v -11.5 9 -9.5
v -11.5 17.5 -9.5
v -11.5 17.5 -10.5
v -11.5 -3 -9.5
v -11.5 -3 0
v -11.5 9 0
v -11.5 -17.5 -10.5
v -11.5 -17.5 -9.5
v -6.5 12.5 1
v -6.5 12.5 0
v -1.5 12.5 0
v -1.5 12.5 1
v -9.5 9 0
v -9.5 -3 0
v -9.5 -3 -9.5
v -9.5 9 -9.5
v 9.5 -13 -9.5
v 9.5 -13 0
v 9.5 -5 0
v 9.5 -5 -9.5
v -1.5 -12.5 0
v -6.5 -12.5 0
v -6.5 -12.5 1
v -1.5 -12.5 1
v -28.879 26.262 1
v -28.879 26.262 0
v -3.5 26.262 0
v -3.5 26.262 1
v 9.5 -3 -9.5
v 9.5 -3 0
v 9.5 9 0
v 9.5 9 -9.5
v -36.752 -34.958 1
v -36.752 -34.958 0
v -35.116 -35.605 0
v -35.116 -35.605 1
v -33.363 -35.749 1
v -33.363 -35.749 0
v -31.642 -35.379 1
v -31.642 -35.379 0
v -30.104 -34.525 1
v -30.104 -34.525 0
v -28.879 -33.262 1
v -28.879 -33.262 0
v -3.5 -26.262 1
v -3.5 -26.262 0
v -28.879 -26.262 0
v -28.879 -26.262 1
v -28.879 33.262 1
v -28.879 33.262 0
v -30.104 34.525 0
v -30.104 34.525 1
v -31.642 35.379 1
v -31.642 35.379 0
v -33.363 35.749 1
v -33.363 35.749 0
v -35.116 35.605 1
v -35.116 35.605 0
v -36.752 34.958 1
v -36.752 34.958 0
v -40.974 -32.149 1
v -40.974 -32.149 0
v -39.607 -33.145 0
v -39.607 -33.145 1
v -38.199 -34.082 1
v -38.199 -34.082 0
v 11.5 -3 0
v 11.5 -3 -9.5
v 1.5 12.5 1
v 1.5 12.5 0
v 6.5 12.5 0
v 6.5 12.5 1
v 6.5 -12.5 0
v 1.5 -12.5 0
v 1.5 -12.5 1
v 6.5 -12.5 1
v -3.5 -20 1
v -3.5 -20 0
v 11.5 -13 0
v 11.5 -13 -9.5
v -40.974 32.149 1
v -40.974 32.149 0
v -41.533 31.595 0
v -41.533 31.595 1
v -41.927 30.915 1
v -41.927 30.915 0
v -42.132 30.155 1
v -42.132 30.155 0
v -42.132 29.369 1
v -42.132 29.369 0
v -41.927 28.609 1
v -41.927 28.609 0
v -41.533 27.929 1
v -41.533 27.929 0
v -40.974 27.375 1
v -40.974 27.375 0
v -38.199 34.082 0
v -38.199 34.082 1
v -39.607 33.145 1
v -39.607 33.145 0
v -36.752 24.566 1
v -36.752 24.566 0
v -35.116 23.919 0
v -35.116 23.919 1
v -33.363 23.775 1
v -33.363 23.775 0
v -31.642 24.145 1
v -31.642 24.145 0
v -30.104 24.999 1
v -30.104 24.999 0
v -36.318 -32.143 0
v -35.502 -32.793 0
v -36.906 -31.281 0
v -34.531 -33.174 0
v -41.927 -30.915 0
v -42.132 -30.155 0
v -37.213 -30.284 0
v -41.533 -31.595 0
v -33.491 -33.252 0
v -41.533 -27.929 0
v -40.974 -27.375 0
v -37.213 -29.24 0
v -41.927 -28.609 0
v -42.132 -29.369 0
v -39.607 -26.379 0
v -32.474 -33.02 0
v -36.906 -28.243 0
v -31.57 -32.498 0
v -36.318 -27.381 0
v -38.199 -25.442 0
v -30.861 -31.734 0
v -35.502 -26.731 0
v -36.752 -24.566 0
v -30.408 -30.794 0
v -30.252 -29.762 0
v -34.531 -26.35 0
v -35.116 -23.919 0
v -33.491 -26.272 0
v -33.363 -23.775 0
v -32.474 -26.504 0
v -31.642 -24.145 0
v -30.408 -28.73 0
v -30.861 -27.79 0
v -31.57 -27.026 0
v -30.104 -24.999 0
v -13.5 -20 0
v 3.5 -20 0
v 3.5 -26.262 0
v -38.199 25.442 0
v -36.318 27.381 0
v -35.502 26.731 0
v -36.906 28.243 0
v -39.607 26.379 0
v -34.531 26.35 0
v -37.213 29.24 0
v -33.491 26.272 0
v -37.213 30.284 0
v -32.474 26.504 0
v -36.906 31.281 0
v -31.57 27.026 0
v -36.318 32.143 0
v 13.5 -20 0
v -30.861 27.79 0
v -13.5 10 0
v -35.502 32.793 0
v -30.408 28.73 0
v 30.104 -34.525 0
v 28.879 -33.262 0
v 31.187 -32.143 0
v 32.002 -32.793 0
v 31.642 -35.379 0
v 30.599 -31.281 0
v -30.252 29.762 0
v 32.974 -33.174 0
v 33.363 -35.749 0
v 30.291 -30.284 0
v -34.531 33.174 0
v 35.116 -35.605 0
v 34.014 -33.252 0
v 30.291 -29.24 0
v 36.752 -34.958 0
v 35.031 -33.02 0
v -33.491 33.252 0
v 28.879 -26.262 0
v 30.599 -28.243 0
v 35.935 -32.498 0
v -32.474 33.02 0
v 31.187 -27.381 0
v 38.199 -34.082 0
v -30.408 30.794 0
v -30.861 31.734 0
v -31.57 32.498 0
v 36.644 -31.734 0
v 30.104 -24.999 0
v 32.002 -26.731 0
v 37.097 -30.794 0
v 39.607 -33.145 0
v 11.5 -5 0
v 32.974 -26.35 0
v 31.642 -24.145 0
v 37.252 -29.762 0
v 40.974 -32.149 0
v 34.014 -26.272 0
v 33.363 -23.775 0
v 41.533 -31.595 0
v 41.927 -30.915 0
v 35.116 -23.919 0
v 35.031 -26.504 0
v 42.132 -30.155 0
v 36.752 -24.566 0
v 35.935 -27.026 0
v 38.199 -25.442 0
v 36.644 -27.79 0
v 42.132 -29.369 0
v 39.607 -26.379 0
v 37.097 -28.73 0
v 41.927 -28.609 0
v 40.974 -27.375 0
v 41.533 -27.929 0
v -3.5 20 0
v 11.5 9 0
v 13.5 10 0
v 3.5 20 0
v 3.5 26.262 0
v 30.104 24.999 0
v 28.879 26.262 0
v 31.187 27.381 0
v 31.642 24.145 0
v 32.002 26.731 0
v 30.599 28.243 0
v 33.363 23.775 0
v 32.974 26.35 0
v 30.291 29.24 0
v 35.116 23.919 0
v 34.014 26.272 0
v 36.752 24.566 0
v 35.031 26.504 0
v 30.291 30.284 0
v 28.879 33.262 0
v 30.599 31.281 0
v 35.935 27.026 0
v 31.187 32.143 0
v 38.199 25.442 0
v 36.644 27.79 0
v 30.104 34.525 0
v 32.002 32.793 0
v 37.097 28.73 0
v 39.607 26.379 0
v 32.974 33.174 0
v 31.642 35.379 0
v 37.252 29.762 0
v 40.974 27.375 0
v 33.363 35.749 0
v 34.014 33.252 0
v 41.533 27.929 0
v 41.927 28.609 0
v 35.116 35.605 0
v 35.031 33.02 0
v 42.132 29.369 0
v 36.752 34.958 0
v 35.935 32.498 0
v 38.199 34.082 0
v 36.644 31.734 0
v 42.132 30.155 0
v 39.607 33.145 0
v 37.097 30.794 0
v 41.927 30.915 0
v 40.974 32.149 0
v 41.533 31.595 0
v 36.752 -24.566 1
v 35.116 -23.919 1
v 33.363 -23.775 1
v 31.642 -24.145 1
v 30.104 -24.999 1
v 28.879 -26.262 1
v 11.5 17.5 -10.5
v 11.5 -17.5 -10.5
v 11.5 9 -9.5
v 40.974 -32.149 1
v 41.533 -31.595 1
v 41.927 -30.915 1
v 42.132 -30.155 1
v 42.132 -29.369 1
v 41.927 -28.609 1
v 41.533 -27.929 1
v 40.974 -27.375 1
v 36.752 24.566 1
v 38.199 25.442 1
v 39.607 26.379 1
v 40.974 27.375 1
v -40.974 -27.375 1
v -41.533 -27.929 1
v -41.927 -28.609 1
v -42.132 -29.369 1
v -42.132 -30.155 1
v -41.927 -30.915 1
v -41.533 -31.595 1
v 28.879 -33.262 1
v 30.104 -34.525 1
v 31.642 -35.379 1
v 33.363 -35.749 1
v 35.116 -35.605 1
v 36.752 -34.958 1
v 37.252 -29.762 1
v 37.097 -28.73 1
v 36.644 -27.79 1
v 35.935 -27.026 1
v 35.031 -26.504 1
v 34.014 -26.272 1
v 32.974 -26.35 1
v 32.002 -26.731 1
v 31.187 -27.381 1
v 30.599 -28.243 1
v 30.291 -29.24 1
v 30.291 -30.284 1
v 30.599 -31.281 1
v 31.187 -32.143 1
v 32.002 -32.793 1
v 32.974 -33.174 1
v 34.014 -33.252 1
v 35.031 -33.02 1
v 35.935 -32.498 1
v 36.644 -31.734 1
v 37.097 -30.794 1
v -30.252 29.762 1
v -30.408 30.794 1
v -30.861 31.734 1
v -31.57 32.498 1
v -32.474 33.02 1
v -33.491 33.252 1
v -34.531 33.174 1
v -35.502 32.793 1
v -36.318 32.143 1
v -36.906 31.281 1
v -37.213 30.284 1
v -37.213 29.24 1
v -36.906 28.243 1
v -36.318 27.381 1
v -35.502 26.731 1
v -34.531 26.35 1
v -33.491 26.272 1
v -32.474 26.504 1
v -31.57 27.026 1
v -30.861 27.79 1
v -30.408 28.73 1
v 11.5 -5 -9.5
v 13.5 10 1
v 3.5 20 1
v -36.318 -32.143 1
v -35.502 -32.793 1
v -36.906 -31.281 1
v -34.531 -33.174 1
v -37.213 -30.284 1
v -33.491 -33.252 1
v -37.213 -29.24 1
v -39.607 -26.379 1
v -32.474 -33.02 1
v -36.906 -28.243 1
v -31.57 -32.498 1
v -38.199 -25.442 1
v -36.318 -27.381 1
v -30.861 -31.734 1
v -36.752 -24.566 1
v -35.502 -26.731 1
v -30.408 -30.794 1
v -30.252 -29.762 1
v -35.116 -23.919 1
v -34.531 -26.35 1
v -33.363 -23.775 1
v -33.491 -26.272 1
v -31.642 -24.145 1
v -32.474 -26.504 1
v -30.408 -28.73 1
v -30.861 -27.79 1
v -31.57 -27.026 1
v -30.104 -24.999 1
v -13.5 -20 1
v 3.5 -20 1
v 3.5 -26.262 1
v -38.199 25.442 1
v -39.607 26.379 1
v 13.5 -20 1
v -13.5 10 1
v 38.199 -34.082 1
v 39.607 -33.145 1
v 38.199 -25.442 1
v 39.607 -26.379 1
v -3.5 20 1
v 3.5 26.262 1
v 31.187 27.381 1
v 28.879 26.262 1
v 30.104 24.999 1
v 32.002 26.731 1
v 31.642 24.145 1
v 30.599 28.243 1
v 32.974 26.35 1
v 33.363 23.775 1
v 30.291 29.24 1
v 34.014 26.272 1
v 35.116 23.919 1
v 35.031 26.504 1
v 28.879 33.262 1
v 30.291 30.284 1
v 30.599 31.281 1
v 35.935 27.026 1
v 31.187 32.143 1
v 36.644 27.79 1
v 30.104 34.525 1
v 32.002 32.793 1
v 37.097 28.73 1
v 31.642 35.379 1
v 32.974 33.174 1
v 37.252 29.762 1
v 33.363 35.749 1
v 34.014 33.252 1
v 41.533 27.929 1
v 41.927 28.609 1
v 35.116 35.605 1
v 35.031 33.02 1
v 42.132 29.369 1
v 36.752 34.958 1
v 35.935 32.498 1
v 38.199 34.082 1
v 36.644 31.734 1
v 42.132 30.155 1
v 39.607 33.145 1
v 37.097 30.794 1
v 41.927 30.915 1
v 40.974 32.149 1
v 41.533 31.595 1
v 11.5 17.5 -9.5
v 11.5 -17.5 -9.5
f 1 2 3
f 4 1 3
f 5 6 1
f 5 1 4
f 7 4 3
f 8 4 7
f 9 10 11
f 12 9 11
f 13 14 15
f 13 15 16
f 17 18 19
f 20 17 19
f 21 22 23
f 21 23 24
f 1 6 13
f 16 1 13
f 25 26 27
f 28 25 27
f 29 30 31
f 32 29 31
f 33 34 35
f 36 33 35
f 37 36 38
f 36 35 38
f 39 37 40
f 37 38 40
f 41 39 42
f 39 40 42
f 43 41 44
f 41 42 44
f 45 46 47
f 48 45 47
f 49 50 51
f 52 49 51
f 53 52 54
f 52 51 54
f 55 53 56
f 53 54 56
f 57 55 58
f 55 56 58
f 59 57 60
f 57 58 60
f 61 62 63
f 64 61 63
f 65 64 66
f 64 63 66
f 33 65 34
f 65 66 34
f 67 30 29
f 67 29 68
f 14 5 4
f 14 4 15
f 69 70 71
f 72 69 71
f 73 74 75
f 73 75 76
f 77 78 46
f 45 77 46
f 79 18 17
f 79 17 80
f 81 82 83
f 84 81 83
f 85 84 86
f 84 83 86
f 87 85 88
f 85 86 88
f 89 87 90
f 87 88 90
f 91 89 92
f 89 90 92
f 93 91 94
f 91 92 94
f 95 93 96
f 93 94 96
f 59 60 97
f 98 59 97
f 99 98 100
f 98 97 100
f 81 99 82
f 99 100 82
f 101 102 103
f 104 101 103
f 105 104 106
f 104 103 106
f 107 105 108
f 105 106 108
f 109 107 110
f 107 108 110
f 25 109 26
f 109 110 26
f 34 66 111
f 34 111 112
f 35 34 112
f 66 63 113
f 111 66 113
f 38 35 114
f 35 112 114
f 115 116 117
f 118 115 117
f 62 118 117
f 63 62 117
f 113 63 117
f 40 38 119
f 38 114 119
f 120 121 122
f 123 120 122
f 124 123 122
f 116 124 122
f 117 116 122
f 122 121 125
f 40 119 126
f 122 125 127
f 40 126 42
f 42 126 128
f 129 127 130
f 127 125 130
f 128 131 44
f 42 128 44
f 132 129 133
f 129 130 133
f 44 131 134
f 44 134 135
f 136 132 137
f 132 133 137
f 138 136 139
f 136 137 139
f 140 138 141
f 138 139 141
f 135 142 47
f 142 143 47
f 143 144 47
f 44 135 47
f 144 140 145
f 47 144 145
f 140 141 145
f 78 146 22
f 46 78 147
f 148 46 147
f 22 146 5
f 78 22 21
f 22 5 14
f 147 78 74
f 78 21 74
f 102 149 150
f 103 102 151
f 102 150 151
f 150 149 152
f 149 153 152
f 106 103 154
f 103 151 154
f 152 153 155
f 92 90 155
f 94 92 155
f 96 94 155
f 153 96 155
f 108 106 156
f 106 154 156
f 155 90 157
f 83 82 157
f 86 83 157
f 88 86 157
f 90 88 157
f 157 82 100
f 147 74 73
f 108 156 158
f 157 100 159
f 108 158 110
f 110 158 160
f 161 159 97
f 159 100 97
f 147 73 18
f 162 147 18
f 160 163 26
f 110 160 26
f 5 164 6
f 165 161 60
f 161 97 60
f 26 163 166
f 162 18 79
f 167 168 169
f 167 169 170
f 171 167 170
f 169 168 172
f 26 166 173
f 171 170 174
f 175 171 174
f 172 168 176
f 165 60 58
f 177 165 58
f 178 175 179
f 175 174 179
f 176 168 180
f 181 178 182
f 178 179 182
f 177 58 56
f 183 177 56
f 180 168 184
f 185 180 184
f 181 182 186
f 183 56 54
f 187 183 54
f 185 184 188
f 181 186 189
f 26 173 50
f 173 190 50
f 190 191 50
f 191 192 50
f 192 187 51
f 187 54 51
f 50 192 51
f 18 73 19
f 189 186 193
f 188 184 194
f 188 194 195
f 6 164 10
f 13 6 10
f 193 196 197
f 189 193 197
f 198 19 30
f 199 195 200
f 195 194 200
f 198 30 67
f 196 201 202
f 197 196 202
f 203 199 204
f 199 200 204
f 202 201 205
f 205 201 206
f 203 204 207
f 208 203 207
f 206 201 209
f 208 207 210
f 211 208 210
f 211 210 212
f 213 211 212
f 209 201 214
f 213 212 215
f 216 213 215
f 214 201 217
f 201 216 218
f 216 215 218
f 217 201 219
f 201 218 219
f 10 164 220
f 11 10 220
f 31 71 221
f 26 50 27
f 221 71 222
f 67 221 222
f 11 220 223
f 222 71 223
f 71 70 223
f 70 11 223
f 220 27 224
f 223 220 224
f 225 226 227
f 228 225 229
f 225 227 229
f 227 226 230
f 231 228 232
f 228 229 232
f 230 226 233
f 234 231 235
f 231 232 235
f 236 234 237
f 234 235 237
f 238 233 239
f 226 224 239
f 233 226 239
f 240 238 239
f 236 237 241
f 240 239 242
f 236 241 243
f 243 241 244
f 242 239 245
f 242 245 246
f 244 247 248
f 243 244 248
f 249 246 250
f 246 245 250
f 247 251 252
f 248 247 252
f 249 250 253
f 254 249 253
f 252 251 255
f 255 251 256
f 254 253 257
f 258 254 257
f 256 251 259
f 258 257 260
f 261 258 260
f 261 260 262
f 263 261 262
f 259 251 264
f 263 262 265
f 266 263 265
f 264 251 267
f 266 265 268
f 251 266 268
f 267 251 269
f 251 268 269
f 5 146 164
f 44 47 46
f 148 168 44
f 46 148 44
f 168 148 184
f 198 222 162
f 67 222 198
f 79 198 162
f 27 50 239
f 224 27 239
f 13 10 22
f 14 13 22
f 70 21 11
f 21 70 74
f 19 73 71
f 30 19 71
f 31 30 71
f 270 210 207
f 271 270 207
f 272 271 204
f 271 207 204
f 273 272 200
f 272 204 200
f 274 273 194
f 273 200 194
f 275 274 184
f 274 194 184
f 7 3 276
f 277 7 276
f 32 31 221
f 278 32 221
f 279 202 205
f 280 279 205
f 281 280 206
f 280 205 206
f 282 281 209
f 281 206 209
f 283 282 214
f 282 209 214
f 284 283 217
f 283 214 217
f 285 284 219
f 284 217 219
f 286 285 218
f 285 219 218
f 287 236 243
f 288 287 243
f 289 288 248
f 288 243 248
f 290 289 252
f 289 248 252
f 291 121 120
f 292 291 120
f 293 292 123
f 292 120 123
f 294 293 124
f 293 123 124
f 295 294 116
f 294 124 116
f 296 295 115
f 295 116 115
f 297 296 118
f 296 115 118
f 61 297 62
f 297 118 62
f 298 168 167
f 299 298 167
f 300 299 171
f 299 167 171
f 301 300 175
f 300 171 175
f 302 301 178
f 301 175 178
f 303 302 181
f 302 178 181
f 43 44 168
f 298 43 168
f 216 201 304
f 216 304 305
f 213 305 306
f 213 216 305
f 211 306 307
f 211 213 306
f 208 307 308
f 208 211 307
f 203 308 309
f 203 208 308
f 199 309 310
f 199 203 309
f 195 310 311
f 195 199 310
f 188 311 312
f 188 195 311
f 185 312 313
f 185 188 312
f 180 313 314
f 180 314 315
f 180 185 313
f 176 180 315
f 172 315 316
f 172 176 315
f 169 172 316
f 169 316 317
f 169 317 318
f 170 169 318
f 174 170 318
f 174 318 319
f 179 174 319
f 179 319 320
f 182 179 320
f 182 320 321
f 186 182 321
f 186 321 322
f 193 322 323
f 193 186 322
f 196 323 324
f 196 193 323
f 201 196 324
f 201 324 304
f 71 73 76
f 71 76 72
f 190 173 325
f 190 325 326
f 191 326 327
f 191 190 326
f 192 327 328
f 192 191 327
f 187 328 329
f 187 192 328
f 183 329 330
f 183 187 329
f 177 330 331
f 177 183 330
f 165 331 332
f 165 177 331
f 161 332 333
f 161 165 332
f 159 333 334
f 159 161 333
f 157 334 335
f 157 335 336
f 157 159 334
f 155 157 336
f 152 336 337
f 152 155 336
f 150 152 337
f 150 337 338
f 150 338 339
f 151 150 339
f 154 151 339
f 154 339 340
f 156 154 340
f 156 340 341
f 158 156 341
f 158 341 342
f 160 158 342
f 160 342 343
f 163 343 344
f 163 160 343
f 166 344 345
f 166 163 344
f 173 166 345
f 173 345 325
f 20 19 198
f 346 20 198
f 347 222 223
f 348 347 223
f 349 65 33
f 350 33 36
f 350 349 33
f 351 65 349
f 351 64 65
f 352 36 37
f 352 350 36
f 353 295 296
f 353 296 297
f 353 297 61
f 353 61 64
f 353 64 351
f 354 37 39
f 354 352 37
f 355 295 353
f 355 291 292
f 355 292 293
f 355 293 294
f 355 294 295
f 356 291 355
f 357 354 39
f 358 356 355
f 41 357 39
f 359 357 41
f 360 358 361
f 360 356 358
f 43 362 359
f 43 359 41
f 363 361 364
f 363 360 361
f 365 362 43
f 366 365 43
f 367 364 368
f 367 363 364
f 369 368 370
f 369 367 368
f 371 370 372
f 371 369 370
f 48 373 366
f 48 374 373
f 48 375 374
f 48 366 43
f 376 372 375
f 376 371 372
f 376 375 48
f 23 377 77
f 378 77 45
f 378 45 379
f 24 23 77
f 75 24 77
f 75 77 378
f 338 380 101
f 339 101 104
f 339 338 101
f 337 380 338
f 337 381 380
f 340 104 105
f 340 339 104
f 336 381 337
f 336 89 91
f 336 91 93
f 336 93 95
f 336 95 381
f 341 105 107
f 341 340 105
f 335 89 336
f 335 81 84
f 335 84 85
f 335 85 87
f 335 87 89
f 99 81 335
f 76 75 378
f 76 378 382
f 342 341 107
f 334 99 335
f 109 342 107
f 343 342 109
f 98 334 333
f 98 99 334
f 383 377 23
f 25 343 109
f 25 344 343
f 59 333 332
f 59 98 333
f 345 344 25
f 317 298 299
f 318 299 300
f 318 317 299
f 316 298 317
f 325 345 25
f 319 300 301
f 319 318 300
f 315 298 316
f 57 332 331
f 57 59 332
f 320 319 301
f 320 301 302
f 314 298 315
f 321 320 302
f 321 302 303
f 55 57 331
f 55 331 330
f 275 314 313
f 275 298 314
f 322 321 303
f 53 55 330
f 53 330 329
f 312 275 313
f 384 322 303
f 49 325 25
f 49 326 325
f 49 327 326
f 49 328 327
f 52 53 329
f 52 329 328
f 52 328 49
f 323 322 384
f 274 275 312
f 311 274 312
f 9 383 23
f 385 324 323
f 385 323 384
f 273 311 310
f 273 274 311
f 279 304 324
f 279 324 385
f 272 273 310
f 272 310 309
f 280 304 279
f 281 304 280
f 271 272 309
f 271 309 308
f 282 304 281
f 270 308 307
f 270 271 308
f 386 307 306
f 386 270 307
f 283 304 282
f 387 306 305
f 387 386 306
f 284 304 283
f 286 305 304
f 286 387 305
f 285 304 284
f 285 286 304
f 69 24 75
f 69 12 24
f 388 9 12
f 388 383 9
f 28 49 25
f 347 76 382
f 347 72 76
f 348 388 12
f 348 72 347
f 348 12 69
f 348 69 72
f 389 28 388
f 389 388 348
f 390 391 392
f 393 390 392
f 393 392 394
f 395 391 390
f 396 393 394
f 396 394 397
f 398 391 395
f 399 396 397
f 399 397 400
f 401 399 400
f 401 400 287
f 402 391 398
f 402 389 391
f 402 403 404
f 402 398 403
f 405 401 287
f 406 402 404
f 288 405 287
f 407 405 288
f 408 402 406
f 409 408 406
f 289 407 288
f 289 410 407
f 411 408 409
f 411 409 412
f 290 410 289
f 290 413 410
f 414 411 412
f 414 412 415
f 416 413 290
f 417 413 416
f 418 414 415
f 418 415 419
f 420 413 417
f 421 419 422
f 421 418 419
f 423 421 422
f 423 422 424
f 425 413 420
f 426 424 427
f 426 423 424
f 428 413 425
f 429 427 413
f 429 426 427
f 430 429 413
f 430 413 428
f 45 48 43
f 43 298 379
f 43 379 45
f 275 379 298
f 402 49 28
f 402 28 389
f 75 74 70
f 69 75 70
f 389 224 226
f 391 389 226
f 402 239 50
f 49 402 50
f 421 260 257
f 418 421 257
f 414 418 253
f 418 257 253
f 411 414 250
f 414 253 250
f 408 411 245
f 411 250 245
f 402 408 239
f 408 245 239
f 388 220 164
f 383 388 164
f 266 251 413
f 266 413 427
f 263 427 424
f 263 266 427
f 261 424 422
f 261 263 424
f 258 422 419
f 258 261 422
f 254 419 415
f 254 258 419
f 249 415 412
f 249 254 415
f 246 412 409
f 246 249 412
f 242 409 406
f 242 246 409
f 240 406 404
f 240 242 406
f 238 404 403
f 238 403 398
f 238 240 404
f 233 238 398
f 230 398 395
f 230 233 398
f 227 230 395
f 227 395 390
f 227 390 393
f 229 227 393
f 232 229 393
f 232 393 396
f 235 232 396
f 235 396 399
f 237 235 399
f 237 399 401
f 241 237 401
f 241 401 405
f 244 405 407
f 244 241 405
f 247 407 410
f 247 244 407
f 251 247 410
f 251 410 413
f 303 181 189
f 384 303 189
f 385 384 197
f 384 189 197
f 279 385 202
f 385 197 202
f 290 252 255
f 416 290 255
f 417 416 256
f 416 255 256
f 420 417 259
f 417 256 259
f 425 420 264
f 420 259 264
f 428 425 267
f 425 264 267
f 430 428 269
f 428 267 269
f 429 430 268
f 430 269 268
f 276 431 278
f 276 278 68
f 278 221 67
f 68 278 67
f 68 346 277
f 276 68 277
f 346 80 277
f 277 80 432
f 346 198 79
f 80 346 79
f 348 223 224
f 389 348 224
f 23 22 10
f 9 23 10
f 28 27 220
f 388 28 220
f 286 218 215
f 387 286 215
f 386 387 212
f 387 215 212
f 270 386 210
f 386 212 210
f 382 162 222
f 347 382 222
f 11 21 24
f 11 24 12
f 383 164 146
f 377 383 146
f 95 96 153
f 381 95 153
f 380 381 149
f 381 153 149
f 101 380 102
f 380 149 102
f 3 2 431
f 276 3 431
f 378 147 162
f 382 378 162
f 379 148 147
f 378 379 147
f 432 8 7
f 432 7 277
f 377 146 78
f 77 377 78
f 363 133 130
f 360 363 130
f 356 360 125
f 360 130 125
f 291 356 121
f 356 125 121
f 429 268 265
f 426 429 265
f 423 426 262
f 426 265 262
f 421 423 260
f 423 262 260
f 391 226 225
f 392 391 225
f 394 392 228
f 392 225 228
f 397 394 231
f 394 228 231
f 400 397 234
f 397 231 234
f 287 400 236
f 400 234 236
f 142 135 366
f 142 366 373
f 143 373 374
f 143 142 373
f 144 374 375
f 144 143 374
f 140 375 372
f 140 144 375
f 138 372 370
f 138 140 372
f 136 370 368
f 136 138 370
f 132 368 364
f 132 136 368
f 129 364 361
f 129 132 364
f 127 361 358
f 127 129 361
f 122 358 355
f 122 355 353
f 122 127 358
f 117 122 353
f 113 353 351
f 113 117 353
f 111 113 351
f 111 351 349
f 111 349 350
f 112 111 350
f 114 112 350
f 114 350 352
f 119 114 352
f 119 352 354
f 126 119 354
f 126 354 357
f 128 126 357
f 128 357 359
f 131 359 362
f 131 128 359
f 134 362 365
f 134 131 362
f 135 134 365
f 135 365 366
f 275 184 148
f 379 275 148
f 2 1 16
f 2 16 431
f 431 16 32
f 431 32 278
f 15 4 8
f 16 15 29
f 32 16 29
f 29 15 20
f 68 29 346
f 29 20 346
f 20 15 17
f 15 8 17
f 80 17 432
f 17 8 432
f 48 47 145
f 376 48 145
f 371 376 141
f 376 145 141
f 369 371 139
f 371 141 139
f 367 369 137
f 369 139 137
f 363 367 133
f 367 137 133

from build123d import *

# Parameters (mm, degrees)
F0_R     = 3.5
F0_W     = 5
F0_H     = 25
F1_DEPTH = 1
F2_W     = 2
F2_H     = 8
F2_W_2   = 1.9999998777
F2_H_2   = 12
F3_DEPTH = 9.5
F4_W     = 23
F4_H     = 35
F5_DEPTH = 1


with BuildPart() as f1:
    # F0 (on Top) → F1 (new body)
    with BuildSketch(Plane.XY):
        with BuildLine():
            Line((-3.5, 20), (-13.5, 10))
            Line((-13.5, 10), (-13.5, -20))
            Line((-13.5, -20), (-3.5, -20))
            Line((-3.5, -20), (-3.5, -26.2619838908))
            Line((-3.5, -26.2619838908), (-28.879, -26.2619838908))
            ThreePointArc((-28.879, -26.2619838908), (-32.4888159516, -23.8965459278), (-36.7523971724, -24.5658314681))
            ThreePointArc((-36.7523971724, -24.5658314681), (-38.907954465, -25.9032249779), (-40.974404202, -27.3745625074))
            ThreePointArc((-40.974404202, -27.3745625074), (-42.1577536748, -29.7619838908), (-40.974404202, -32.1494052742))
            ThreePointArc((-40.974404202, -32.1494052742), (-38.907954465, -33.6207428037), (-36.7523971724, -34.9581363135))
            ThreePointArc((-36.7523971724, -34.9581363135), (-32.4888159516, -35.6274218538), (-28.879, -33.2619838908))
            Line((-28.879, -33.2619838908), (28.879, -33.2619838908))
            ThreePointArc((28.879, -33.2619838908), (32.4888159516, -35.6274218538), (36.7523971724, -34.9581363135))
            ThreePointArc((36.7523971724, -34.9581363135), (38.907954465, -33.6207428037), (40.974404202, -32.1494052742))
            ThreePointArc((40.974404202, -32.1494052742), (42.1577536748, -29.7619838908), (40.974404202, -27.3745625074))
            ThreePointArc((40.974404202, -27.3745625074), (38.907954465, -25.9032249779), (36.7523971724, -24.5658314681))
            ThreePointArc((36.7523971724, -24.5658314681), (32.4888159516, -23.8965459278), (28.879, -26.2619838908))
            Line((28.879, -26.2619838908), (3.5, -26.2619838908))
            Line((3.5, -26.2619838908), (3.5, -20))
            Line((3.5, -20), (13.5, -20))
            Line((13.5, -20), (13.5, 10))
            Line((13.5, 10), (3.5, 20))
            Line((3.5, 20), (3.5, 26.2619838908))
            Line((3.5, 26.2619838908), (28.879, 26.2619838908))
            ThreePointArc((28.879, 26.2619838908), (32.4888159516, 23.8965459278), (36.7523971724, 24.5658314681))
            ThreePointArc((36.7523971724, 24.5658314681), (38.907954465, 25.9032249779), (40.974404202, 27.3745625074))
            ThreePointArc((40.974404202, 27.3745625074), (42.1577536748, 29.7619838908), (40.974404202, 32.1494052742))
            ThreePointArc((40.974404202, 32.1494052742), (38.907954465, 33.6207428037), (36.7523971724, 34.9581363135))
            ThreePointArc((36.7523971724, 34.9581363135), (32.4888159516, 35.6274218538), (28.879, 33.2619838908))
            Line((28.879, 33.2619838908), (-28.879, 33.2619838908))
            ThreePointArc((-28.879, 33.2619838908), (-32.4888159516, 35.6274218538), (-36.7523971724, 34.9581363135))
            ThreePointArc((-36.7523971724, 34.9581363135), (-38.907954465, 33.6207428037), (-40.974404202, 32.1494052742))
            ThreePointArc((-40.974404202, 32.1494052742), (-42.1577536748, 29.7619838908), (-40.974404202, 27.3745625074))
            ThreePointArc((-40.974404202, 27.3745625074), (-38.907954465, 25.9032249779), (-36.7523971724, 24.5658314681))
            ThreePointArc((-36.7523971724, 24.5658314681), (-32.4888159516, 23.8965459278), (-28.879, 26.2619838908))
            Line((-28.879, 26.2619838908), (-3.5, 26.2619838908))
            Line((-3.5, 26.2619838908), (-3.5, 20))
        make_face()
        with Locations((-33.7523971724, -29.7619838908)):
            Circle(F0_R, mode=Mode.SUBTRACT)
        with Locations((33.7523971724, -29.7619838908)):
            Circle(F0_R, mode=Mode.SUBTRACT)
        with Locations((-4, 0)):
            Rectangle(F0_W, F0_H, mode=Mode.SUBTRACT)
        with Locations((-33.7523971724, 29.7619838908)):
            Circle(F0_R, mode=Mode.SUBTRACT)
        with Locations((4, 0)):
            Rectangle(F0_W, F0_H, mode=Mode.SUBTRACT)
        with Locations((33.7523971724, 29.7619838908)):
            Circle(F0_R, mode=Mode.SUBTRACT)
    extrude(amount=F1_DEPTH)

    # F2 (on Top) → F3 (join)
    with BuildSketch(Plane.XY):
        with Locations((10.5, -9)):
            Rectangle(F2_W, F2_H)
        with Locations((10.5000000611, 3)):
            Rectangle(F2_W_2, F2_H_2)
        with Locations((-10.5000000611, 3)):
            Rectangle(F2_W_2, F2_H_2)
    extrude(amount=-F3_DEPTH)

    # F4 (on face) → F5 (join)
    with BuildSketch(Plane(origin=(0, 0, -9.5), x_dir=(1, 0, 0), z_dir=(0, 0, -1))):
        Rectangle(F4_W, F4_H)
    extrude(amount=F5_DEPTH)


solid = f1.part
